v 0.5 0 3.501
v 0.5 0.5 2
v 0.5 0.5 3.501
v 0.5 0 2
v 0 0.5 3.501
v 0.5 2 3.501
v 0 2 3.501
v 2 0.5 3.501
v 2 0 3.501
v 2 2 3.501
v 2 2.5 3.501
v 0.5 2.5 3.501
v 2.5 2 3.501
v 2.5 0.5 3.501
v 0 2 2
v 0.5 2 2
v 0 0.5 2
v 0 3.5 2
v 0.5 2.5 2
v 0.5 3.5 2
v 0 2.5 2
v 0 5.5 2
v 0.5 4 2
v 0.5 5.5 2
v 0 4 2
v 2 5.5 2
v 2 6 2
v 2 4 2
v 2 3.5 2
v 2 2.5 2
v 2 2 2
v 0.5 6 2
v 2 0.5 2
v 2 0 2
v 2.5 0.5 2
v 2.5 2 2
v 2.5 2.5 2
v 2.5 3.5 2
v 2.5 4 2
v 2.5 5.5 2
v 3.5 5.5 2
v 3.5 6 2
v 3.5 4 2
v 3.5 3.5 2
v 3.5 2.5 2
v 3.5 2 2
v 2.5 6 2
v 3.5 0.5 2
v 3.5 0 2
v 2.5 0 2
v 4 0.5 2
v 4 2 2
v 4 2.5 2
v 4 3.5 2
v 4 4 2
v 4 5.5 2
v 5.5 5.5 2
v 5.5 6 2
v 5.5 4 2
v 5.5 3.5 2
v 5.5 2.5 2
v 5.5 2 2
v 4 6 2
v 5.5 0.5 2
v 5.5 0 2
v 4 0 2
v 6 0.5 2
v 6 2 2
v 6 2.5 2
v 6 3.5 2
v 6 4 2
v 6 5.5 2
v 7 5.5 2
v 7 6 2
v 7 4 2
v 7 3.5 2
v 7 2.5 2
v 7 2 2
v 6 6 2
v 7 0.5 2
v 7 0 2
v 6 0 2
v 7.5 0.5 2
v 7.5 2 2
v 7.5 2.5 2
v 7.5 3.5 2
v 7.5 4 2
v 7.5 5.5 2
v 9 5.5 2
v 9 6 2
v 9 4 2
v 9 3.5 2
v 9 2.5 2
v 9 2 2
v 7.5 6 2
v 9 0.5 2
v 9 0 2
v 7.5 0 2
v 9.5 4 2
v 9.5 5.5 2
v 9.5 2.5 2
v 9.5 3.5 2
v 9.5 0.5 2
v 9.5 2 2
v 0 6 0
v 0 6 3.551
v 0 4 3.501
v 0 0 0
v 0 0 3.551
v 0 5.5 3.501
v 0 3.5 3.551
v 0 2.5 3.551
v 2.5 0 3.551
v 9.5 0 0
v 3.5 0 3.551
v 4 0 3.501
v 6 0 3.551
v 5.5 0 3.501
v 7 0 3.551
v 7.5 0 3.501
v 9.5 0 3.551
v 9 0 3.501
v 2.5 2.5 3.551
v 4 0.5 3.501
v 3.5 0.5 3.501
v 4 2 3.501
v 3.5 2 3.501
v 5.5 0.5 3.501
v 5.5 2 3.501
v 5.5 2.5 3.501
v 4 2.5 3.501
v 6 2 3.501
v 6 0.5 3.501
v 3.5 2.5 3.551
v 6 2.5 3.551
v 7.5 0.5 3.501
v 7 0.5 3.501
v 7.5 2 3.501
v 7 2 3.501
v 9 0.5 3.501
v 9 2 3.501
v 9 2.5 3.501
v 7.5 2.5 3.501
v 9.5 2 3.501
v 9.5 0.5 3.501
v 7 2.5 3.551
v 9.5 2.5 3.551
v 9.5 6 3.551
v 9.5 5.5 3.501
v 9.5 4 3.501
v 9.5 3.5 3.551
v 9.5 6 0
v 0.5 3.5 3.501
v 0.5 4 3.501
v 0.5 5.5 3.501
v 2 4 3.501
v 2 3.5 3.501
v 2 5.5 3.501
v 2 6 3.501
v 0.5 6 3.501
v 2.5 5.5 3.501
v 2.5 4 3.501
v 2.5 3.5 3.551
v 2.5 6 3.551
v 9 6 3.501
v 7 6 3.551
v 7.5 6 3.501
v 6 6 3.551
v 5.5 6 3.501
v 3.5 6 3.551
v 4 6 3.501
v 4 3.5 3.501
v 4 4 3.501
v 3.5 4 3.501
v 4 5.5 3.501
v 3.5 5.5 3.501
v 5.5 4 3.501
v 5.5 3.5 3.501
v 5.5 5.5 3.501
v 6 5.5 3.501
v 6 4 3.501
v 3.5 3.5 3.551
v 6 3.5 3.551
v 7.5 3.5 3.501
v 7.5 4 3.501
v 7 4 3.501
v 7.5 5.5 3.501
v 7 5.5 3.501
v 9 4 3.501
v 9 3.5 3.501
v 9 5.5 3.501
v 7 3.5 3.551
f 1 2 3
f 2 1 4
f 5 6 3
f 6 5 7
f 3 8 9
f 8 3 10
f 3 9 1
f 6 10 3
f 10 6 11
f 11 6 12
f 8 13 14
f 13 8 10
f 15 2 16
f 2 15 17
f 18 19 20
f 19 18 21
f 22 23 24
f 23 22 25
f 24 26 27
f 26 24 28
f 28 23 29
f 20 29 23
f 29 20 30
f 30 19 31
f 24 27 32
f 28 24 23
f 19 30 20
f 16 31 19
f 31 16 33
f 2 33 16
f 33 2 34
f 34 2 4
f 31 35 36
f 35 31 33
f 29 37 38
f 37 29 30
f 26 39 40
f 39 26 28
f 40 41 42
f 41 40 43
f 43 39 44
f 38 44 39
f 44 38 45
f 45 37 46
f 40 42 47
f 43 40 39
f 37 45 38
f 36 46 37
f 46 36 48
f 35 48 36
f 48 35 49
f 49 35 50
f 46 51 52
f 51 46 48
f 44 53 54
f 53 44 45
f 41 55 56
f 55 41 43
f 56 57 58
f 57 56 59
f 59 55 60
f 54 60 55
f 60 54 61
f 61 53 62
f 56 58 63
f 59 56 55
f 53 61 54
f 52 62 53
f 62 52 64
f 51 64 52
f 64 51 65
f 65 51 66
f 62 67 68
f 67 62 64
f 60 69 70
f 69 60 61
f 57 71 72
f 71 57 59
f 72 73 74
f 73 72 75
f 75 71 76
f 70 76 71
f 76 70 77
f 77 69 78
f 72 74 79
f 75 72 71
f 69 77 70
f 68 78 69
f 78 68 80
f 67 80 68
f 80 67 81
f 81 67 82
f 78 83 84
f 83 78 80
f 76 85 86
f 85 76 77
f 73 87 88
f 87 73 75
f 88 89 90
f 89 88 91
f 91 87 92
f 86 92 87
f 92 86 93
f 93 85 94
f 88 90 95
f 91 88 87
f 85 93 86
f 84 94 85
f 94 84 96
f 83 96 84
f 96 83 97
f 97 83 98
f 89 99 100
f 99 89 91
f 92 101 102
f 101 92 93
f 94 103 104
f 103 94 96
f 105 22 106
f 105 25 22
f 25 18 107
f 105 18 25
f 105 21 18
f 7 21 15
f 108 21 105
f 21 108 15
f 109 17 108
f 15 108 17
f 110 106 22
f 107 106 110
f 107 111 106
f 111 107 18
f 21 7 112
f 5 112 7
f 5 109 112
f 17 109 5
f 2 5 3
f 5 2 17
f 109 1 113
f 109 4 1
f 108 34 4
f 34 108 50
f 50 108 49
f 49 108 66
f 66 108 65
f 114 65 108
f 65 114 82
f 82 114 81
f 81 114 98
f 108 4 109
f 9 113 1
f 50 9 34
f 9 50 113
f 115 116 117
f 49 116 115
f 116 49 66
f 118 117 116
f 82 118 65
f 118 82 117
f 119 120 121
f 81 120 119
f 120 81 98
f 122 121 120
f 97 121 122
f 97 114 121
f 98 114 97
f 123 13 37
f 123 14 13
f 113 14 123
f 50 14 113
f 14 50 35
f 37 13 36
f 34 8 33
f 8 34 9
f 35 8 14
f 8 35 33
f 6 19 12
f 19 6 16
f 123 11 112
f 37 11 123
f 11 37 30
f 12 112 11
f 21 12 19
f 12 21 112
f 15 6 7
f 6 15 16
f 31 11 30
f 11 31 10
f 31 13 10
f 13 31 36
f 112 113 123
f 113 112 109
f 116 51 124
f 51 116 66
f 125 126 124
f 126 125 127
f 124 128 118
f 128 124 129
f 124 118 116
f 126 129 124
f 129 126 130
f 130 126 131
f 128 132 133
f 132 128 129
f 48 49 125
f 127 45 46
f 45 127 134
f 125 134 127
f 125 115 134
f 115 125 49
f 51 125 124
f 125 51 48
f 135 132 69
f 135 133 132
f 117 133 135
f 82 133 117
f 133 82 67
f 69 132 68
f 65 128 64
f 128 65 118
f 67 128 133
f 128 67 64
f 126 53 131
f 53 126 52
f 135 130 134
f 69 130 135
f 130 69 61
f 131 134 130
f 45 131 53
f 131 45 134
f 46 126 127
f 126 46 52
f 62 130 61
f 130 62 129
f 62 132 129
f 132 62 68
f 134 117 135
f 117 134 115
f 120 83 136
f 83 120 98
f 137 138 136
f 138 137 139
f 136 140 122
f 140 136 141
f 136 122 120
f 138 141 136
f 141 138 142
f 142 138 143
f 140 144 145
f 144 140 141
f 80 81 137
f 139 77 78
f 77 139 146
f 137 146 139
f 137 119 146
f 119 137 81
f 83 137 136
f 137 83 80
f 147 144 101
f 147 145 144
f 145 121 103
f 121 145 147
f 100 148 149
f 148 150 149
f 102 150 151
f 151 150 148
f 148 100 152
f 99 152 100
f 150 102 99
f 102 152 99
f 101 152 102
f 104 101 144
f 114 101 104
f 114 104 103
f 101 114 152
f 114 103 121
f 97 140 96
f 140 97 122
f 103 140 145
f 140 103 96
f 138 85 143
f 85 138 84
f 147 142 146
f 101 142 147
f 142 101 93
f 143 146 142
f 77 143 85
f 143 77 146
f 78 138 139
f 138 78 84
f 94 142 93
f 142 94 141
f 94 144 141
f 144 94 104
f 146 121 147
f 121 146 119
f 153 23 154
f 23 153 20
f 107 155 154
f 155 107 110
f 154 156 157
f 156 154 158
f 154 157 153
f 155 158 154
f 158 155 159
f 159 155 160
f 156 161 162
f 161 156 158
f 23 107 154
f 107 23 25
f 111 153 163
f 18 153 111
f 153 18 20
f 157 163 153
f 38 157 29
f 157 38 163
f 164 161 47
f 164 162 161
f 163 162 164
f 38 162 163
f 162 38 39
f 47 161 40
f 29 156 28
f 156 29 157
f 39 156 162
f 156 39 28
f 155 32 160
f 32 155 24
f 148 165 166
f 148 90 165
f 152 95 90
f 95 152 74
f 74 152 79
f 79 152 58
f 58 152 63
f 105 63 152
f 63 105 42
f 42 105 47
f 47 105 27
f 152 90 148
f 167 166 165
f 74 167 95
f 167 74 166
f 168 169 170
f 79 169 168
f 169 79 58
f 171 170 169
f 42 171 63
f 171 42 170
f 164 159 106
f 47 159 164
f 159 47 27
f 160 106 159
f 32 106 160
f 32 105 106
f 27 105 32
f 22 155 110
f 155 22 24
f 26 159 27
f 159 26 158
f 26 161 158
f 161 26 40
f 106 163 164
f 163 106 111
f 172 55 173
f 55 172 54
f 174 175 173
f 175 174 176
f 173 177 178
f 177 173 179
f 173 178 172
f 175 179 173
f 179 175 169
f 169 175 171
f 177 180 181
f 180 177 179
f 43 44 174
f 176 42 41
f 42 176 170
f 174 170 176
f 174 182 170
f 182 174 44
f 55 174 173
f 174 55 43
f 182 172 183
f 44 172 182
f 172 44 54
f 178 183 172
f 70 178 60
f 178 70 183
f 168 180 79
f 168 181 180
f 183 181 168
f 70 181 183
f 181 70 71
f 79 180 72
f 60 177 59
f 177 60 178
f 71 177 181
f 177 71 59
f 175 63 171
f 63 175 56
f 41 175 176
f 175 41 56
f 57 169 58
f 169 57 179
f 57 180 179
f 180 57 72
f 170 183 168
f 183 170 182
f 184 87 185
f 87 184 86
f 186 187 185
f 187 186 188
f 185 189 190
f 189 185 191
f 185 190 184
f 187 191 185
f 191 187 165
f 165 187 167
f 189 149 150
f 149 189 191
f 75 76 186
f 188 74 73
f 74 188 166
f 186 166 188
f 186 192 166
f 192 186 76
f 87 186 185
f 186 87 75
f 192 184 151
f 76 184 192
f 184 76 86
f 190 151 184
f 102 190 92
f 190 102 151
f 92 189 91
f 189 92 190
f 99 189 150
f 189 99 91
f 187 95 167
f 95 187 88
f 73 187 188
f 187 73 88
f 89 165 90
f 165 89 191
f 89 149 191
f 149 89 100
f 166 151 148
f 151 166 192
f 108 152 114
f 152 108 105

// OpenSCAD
postxy = 0.5;
postheight = 1.501;
postseparation = 1.5;
membranethickness = 0.05;
membrane_xseparation = 1;
membrane_yseparation = 1;
xslab = 9.5;
yslab = 6;
zslab = 2;

module post(size,height) {
  color("Red") cube(size=[size,size,height],center=false);
}

module slab(x,y,z) {
	cube(size=[x,y,z],center=false);
}

module membrane(postxy,postheight,postseparation,membranethickness) {
	post(postxy,postheight);
	translate([postseparation+postxy,0,0]) post(postxy,postheight);
	translate([0,postseparation+postxy,0]) post(postxy,postheight);
	translate([postseparation+postxy,postseparation+postxy,0]) post(postxy,postheight);
	translate([0,0,postheight]) cube([postseparation+2*postxy,postseparation+2*postxy,membranethickness]);
}

xsep = membrane_xseparation+(postseparation+2*postxy);
ysep = membrane_yseparation+(postseparation+2*postxy);

translate([0,0,zslab]) membrane(postxy,postheight,postseparation,membranethickness);
translate([xsep,0,zslab]) membrane(postxy,postheight,postseparation,membranethickness);
translate([2*xsep,0,zslab]) membrane(postxy,postheight,postseparation,membranethickness);

translate([0,ysep,zslab]) membrane(postxy,postheight,postseparation,membranethickness);
translate([xsep,ysep,zslab]) membrane(postxy,postheight,postseparation,membranethickness);
translate([2*xsep,ysep,zslab]) membrane(postxy,postheight,postseparation,membranethickness);

slab(xslab,yslab,zslab);
